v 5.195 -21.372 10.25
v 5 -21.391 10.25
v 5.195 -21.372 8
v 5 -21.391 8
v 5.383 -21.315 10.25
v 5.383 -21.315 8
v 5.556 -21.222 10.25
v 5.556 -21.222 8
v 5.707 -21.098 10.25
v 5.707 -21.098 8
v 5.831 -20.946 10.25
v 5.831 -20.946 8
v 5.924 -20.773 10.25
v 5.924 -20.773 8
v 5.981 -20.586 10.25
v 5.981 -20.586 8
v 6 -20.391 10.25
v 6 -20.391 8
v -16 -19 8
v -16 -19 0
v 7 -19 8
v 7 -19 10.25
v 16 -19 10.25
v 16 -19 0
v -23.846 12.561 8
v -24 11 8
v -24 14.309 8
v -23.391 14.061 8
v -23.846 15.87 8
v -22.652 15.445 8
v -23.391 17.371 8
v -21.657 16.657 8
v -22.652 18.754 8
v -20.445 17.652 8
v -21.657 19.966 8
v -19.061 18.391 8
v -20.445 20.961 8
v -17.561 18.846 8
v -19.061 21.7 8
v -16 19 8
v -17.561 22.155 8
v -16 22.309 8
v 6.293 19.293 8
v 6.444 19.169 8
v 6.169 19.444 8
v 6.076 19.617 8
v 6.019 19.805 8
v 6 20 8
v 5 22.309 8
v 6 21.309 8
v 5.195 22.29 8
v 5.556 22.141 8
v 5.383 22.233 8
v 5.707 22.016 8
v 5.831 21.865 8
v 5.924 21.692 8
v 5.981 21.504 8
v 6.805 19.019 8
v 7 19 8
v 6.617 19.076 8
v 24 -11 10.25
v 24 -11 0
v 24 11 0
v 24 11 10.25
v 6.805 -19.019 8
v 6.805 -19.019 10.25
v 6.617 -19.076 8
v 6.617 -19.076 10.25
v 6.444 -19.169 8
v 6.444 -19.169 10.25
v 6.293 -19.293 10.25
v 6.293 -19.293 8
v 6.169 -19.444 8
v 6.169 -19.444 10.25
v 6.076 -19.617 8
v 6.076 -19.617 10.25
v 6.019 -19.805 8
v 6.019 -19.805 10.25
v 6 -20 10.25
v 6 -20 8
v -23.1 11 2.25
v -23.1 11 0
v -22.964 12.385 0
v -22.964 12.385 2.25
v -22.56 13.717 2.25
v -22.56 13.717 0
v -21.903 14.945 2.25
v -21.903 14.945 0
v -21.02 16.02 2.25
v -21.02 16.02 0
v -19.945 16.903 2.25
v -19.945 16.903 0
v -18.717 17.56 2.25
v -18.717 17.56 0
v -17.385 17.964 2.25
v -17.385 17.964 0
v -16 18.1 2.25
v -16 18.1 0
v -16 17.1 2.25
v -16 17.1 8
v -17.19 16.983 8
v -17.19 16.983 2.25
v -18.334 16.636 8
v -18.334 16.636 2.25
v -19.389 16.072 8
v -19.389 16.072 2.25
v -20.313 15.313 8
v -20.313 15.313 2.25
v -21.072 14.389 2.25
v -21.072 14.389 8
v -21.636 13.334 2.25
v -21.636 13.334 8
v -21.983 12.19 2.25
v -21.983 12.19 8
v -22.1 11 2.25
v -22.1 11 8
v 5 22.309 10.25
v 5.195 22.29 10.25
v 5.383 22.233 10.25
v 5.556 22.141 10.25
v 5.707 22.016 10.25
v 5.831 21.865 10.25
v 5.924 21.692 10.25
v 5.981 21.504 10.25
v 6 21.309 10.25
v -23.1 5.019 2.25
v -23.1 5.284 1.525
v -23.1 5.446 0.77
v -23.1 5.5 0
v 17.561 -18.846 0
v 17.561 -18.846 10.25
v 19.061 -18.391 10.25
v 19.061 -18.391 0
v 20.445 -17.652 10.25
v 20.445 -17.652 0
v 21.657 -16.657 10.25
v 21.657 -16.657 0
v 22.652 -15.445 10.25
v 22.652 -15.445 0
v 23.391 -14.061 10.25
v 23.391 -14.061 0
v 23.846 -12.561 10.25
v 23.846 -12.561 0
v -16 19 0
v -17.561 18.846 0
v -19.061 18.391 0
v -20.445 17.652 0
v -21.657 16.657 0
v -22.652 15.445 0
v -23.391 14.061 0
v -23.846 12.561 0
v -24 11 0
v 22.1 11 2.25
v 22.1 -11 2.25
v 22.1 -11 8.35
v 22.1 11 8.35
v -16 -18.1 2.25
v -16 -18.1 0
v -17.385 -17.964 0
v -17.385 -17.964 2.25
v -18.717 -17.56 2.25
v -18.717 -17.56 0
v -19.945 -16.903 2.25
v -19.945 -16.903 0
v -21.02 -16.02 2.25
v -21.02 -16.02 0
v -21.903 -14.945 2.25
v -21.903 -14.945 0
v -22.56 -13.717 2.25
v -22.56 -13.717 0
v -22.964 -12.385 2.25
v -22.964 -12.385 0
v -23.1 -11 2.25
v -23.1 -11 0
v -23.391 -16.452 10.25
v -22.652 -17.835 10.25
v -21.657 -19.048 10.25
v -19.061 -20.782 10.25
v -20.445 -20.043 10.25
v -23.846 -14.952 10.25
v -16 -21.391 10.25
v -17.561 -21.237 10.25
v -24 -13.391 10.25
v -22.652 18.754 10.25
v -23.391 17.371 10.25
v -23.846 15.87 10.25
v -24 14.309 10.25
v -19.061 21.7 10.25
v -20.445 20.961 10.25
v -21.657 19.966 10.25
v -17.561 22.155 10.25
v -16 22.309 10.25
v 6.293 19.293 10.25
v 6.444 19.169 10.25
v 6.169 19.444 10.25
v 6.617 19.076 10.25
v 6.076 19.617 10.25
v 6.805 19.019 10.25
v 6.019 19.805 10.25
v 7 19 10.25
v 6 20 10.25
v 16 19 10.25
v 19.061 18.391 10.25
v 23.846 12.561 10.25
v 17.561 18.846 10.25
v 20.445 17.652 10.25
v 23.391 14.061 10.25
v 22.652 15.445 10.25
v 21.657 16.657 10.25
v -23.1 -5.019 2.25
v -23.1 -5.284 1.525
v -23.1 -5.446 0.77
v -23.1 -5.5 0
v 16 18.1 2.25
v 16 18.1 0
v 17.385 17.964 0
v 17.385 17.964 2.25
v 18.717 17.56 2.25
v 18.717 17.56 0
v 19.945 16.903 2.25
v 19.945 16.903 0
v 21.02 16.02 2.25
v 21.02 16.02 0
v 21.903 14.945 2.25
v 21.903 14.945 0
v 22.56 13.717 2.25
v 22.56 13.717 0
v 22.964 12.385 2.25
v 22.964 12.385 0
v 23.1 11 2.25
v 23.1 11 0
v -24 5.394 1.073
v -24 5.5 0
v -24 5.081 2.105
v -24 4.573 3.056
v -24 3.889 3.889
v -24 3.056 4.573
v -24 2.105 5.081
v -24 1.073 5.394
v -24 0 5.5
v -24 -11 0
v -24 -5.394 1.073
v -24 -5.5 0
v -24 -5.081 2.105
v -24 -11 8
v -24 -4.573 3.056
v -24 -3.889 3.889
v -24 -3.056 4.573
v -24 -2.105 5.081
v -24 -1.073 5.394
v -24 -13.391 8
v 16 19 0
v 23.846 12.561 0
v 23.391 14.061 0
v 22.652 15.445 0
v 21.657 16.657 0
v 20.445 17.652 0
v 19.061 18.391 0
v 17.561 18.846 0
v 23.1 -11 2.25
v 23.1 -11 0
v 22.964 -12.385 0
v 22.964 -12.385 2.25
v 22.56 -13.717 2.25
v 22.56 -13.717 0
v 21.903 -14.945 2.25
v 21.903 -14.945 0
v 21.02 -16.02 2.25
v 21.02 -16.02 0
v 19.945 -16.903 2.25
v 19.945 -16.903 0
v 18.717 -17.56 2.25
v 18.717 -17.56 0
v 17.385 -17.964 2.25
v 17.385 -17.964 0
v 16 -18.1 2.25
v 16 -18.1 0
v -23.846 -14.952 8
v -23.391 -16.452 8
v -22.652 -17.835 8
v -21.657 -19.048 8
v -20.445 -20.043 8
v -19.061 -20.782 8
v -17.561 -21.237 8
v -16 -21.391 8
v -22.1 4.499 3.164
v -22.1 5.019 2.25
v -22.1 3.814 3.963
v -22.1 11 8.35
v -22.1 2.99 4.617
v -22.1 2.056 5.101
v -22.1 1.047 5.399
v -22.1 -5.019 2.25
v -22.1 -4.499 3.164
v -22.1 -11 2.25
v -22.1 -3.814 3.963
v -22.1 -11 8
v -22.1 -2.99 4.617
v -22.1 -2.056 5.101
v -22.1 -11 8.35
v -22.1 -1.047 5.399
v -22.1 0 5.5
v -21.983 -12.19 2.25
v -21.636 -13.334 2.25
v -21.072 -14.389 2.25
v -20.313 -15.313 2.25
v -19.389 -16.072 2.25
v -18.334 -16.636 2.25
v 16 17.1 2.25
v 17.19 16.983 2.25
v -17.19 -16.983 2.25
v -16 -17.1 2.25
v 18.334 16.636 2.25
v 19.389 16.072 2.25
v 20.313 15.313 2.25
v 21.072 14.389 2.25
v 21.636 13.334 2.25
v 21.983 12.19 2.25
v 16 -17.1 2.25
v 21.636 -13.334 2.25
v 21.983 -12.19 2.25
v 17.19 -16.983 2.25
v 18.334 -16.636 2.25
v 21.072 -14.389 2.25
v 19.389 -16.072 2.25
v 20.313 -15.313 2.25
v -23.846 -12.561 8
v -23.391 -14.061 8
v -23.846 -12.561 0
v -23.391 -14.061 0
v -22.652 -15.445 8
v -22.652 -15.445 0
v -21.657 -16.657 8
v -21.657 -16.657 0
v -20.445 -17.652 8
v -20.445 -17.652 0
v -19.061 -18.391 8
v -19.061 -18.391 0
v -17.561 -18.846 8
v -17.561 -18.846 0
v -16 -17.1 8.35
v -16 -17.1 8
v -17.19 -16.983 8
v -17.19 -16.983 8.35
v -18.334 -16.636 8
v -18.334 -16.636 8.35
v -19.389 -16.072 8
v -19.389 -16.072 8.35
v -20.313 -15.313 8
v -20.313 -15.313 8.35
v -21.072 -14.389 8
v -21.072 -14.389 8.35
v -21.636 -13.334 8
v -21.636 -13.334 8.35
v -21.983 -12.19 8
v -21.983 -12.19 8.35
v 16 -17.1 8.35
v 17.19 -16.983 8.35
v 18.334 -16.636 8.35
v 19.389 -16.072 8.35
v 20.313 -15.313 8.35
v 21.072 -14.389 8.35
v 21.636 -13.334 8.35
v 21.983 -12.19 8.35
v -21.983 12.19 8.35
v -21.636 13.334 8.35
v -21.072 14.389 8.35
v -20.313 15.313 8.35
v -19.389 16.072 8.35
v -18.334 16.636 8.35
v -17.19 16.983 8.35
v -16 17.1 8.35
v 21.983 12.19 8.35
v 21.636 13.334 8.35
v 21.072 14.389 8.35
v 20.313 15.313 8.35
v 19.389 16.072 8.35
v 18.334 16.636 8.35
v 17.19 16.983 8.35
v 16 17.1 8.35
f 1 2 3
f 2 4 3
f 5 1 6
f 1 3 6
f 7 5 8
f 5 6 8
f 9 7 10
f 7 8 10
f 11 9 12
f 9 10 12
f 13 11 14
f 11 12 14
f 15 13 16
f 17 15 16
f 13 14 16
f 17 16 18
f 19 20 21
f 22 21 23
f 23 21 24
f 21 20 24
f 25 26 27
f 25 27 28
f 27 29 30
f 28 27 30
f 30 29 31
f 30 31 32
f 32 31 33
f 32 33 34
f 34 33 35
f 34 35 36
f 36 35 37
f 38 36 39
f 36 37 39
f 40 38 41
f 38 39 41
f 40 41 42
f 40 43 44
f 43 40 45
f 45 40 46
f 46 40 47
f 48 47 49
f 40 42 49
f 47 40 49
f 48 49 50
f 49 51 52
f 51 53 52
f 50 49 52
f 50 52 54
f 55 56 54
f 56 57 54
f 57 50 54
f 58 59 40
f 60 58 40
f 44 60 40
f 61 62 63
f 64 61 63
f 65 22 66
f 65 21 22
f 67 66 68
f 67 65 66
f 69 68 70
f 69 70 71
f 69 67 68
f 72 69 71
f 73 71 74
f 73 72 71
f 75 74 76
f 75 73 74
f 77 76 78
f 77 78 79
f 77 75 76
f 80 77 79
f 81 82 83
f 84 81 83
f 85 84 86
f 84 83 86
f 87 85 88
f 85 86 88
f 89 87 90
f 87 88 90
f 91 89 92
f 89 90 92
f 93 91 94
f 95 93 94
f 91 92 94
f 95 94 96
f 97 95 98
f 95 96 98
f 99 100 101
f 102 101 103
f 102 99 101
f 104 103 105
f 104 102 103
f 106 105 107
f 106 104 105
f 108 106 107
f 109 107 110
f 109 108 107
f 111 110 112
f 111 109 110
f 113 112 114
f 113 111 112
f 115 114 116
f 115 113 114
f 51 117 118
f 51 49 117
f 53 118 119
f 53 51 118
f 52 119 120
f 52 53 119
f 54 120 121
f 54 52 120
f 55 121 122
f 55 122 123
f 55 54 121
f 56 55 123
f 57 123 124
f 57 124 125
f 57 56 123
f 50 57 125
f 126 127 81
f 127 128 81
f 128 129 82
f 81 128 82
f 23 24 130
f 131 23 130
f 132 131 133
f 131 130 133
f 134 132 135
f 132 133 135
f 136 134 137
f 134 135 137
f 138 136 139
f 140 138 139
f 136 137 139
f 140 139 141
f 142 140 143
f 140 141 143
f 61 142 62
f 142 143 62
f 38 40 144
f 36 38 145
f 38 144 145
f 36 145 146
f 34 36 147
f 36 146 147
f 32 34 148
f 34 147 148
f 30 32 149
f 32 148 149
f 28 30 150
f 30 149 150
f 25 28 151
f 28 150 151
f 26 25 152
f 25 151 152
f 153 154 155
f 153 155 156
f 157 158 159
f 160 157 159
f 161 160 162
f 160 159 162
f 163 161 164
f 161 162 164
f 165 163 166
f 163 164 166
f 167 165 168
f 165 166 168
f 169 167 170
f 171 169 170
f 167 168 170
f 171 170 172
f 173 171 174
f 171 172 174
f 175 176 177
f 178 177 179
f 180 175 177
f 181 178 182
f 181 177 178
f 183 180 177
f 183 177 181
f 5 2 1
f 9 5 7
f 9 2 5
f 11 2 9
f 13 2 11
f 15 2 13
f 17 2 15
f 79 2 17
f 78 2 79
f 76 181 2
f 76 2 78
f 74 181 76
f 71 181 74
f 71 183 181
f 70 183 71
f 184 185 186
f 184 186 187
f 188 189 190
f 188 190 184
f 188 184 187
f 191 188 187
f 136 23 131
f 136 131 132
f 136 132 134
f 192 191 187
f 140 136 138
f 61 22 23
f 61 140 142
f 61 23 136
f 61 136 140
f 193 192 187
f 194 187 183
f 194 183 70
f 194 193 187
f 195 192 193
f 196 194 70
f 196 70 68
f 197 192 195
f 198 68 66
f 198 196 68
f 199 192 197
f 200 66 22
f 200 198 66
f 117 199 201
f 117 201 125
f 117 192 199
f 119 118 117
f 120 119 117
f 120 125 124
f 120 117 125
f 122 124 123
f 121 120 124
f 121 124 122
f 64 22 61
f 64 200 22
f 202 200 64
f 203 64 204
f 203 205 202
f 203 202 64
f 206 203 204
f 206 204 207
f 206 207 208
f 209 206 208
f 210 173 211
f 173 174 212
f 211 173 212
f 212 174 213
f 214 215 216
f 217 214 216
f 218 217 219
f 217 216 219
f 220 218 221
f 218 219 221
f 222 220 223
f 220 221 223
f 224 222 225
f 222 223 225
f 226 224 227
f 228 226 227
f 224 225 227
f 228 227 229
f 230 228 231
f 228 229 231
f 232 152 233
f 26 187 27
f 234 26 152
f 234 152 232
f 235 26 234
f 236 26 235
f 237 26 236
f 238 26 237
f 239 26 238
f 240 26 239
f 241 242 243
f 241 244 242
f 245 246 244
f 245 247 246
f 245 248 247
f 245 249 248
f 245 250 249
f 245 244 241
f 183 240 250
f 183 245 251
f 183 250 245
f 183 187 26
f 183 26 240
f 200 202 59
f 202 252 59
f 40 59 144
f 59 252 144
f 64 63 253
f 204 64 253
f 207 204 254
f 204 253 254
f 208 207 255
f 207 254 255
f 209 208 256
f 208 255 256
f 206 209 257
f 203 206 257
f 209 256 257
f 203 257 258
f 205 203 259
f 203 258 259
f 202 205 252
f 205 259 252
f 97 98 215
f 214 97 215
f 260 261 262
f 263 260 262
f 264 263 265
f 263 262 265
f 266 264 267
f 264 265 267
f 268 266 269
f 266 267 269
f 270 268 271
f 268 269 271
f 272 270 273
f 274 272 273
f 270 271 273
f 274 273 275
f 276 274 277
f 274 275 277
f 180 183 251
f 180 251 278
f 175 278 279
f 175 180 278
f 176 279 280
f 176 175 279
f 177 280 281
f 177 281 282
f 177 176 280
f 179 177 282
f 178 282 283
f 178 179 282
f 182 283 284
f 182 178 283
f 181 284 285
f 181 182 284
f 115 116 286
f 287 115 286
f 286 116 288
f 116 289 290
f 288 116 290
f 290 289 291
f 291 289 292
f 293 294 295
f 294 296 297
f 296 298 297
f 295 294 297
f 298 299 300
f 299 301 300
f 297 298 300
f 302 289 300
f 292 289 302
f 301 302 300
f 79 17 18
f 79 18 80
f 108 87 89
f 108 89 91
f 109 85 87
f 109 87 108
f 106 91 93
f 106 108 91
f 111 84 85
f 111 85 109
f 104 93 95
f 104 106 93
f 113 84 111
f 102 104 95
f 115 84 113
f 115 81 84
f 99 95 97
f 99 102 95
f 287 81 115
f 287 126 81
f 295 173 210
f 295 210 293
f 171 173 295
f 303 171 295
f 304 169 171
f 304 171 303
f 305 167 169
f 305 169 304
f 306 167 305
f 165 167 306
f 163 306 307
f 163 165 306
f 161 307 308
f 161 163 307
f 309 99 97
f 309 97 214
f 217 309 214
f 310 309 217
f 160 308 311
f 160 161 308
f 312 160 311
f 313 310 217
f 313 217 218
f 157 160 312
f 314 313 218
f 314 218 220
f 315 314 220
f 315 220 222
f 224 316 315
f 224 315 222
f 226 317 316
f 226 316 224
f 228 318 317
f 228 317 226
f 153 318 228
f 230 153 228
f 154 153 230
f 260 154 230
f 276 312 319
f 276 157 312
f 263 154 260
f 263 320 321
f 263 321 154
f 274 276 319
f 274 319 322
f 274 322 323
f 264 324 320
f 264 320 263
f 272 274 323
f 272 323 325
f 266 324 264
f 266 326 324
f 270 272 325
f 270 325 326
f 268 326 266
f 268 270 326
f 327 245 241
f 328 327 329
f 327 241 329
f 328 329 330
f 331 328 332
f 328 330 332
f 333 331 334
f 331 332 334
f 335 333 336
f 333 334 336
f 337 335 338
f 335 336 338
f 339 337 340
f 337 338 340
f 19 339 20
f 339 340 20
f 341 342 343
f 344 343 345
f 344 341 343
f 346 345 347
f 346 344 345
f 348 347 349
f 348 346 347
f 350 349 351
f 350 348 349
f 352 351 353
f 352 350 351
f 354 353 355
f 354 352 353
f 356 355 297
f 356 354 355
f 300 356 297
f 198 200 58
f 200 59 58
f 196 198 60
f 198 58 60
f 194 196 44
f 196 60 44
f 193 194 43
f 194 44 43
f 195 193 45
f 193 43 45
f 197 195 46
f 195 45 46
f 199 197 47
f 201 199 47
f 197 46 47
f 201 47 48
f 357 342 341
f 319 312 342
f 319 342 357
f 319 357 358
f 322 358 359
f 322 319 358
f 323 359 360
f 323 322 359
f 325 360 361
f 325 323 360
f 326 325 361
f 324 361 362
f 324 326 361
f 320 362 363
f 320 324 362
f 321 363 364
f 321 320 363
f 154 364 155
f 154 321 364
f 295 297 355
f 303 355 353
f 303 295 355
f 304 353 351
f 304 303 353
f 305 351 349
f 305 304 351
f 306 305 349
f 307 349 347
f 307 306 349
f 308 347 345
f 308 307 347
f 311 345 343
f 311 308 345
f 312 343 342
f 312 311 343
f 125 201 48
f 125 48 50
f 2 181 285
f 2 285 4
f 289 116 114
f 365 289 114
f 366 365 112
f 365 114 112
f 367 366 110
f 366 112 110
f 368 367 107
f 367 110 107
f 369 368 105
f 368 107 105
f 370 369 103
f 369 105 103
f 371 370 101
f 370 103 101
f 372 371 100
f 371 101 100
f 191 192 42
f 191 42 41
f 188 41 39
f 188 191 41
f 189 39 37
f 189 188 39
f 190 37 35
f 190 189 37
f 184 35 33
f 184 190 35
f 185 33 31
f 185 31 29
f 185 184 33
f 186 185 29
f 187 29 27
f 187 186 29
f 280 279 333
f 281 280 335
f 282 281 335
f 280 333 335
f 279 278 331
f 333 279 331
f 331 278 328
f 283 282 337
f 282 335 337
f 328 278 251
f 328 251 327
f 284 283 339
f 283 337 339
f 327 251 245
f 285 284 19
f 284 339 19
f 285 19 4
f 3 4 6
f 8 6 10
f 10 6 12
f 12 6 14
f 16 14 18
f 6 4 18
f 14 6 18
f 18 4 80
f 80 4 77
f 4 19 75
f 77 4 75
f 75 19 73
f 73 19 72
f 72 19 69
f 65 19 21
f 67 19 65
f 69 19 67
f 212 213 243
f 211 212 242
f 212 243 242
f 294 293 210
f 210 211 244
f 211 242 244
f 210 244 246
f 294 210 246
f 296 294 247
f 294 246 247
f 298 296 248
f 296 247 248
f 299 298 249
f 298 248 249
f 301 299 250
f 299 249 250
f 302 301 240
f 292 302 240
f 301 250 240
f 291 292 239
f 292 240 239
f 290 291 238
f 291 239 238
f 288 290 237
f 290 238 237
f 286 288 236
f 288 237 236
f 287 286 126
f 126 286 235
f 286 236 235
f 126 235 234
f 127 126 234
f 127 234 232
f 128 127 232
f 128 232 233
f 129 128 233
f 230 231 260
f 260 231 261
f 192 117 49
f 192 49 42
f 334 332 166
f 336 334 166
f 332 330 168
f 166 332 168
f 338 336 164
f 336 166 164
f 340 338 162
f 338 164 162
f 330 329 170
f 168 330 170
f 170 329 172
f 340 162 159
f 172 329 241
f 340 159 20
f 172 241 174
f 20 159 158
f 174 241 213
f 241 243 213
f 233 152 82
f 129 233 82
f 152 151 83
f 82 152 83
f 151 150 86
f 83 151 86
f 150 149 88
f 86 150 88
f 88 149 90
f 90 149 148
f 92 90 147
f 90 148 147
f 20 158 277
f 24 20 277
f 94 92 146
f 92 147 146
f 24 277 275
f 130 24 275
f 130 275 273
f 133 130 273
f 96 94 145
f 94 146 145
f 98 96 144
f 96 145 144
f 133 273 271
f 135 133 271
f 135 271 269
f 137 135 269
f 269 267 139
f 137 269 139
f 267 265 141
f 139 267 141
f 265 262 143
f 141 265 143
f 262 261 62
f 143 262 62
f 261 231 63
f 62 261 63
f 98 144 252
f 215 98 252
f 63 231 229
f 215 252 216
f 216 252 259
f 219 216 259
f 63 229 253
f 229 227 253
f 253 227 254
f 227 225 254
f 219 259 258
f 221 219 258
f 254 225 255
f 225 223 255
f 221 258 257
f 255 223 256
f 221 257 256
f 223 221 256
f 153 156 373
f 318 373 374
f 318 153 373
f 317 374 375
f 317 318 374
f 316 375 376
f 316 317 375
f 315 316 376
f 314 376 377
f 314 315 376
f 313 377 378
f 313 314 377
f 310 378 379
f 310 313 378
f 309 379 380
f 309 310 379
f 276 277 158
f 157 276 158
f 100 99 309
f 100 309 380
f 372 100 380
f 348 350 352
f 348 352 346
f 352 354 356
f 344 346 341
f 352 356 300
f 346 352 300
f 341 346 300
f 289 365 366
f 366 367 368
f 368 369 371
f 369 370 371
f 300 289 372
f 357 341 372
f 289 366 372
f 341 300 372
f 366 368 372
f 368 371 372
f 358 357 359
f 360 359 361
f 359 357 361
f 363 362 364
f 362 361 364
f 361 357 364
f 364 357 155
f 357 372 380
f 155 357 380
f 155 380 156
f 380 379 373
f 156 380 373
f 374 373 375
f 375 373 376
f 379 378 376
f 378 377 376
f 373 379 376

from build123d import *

# Parameters (mm, degrees)
F1_DEPTH     = 10.25
F3_DEPTH     = 2.25
F4_R         = 1
F5_T         = 1.9
F5_T3_DEPTH  = 4.8
F5_T5_DEPTH  = 25.8
F5_T8_ANGLE  = 90.000000001
F5_T10_ANGLE = 90.000000001
F7_DEPTH     = 2.25
F9_DEPTH     = 6.4


# Not quite as in the source:
# - a shell that OpenCascade refuses in one call is made with other operations: the cavity is built on its own and cut out


with BuildPart() as f1:
    # F0 (on Top) → F1 (new body)
    with BuildSketch(Plane.XY):
        with BuildLine():
            Line((16, 19), (-16, 19))
            ThreePointArc((-16, 19), (-21.6568542495, 16.6568542495), (-24, 11))
            Line((-24, 11), (-24, -11))
            ThreePointArc((-24, -11), (-21.6568542495, -16.6568542495), (-16, -19))
            Line((-16, -19), (16, -19))
            ThreePointArc((16, -19), (21.6568542495, -16.6568542495), (24, -11))
            Line((24, -11), (24, 11))
            ThreePointArc((24, 11), (21.6568542495, 16.6568542495), (16, 19))
        make_face()
    extrude(amount=F1_DEPTH)

    # F2 (on face) → F3 (join)
    with BuildSketch(Plane.XY.offset(10.25)):
        with BuildLine():
            Line((6, 22.309198174), (-16, 22.309198174))
            ThreePointArc((-16, 22.309198174), (-21.6568542495, 19.9660524235), (-24, 14.309198174))
            Line((-24, 14.309198174), (-24, 11))
            ThreePointArc((-24, 11), (-21.6568542495, 16.6568542495), (-16, 19))
            Line((-16, 19), (6, 19))
            Line((6, 19), (6, 22.309198174))
        make_face()
        with BuildLine():
            Line((6, -21.390801826), (6, -19))
            Line((6, -19), (-16, -19))
            ThreePointArc((-16, -19), (-21.6568542495, -16.6568542495), (-24, -11))
            Line((-24, -11), (-24, -13.390801826))
            ThreePointArc((-24, -13.390801826), (-21.6568542495, -19.0476560755), (-16, -21.390801826))
            Line((-16, -21.390801826), (6, -21.390801826))
        make_face()
    extrude(amount=-F3_DEPTH)

    # F4
    f4_edges = [f1.edges().sort_by_distance(p)[0] for p in [
        (6, -21.390802, 9.125),
        (6, -19, 9.125),
        (6, 19, 9.125),
        (6, 22.309198, 9.125),
    ]]
    fillet(f4_edges, radius=F4_R)

    # F5: shell of thickness 1.9, made by hand


with BuildPart() as f5_core1:
    # F5_t2: copy of F1
    add(f1.part)

    # the walls: a layer under each face that stays
    f5_faces = [f5_core1.faces().sort_by_distance(p)[0] for p in [
        (0, 19, 5.125),
        (0, 0.459198174, 10.25),
        (6.2928932188, 19.2928932188, 9.125),
        (21.6568542495, 16.6568542495, 5.125),
        (-18.8333333333, 20.4243318117, 8),
        (-21.6568542495, 16.6568542495, 4),
        (6, 20.654599087, 9.125),
        (24, 0, 5.125),
        (21.6568542495, -16.6568542495, 5.125),
        (-5.5, 22.309198174, 9.125),
        (0, -19, 5.125),
        (-21.6568542495, 19.9660524235, 9.125),
        (6.2928932188, -19.2928932188, 9.125),
        (-24, 0.459198174, 5.125),
        (6, -20.195400913, 9.125),
        (-21.6568542495, -19.0476560755, 9.125),
        (-5.5, -21.390801826, 9.125),
        (-21.6568542495, -16.6568542495, 4),
        (-18.8333333333, -19.6590015216, 8),
    ]]
    thicken(f5_faces, amount=-F5_T, mode=Mode.SUBTRACT)

    # F5_s4 → F5_t3 (cut)
    with BuildSketch(Plane.YZ.offset(4.1)):
        Polygon((19.019, 7.981), (17.1, 8), (17.1, 9.9), (19, 9.9), align=None)
        Polygon((-19.019, 7.981), (-17.1, 8), (-17.1, 9.9), (-19, 9.9), align=None)
    extrude(amount=F5_T3_DEPTH, mode=Mode.SUBTRACT)

    # F5_s6 → F5_t5 (cut)
    with BuildSketch(Plane.YZ.offset(-17.9)):
        Polygon((19.019, 7.981), (17.1, 8), (17.1, 9.9), (19, 9.9), align=None)
        Polygon((-19.019, 7.981), (-17.1, 8), (-17.1, 9.9), (-19, 9.9), align=None)
    extrude(amount=F5_T5_DEPTH, mode=Mode.SUBTRACT)

    # F5_s7 → F5_t8 (revolve, cut)
    with BuildSketch(Plane.XZ.offset(-11)):
        Polygon((-24.019, 7.981), (-24, 9.9), (-22.1, 9.9), (-22.1, 8), align=None)
    revolve(axis=Axis((-16, 11, 8), (0, 0, -1)), revolution_arc=F5_T8_ANGLE, mode=Mode.SUBTRACT)

    # F5_s9 → F5_t10 (revolve, cut)
    with BuildSketch(Plane.YZ.offset(-16)):
        Polygon((-19.019, 7.981), (-17.1, 8), (-17.1, 9.9), (-19, 9.9), align=None)
    revolve(axis=Axis((-16, -11, 8), (0, 0, -1)), revolution_arc=F5_T10_ANGLE, mode=Mode.SUBTRACT)


with BuildPart() as f1_1:
    add(f1.part)

    # what is left inside the walls is the cavity
    f5_cavity = [f5_core1.part.solids().sort_by_distance(p)[0] for p in [
        (0, -5.7, 0.019),
    ]]
    add(f5_cavity, mode=Mode.SUBTRACT)

    # F6 (on face) → F7 (cut)
    with BuildSketch(Plane(origin=(0, 0, 0), x_dir=(1, 0, 0), z_dir=(0, 0, -1))):
        with BuildLine():
            ThreePointArc((-16, 18.1000009179), (-21.0204587955, 16.0204587955), (-23.1000009179, 11))
            Line((-23.1000009179, 11), (-23.1000009179, -11))
            ThreePointArc((-23.1000009179, -11), (-21.0204587955, -16.0204587955), (-16, -18.1000009179))
            Line((-16, -18.1000009179), (16, -18.1000009179))
            ThreePointArc((16, -18.1000009179), (21.0204587955, -16.0204587955), (23.1000009179, -11))
            Line((23.1000009179, -11), (23.1000009179, 11))
            ThreePointArc((23.1000009179, 11), (21.0204587955, 16.0204587955), (16, 18.1000009179))
            Line((16, 18.1000009179), (-16, 18.1000009179))
        make_face()
        with BuildLine():
            Line((16, -17.1), (-16, -17.1))
            ThreePointArc((-16, -17.1), (-20.3133513652, -15.3133513652), (-22.1, -11))
            Line((-22.1, -11), (-22.1, 11))
            ThreePointArc((-22.1, 11), (-20.3133513652, 15.3133513652), (-16, 17.1))
            Line((-16, 17.1), (16, 17.1))
            ThreePointArc((16, 17.1), (20.3133513652, 15.3133513652), (22.1, 11))
            Line((22.1, 11), (22.1, -11))
            ThreePointArc((22.1, -11), (20.3133513652, -15.3133513652), (16, -17.1))
        make_face(mode=Mode.SUBTRACT)
    extrude(amount=-F7_DEPTH, mode=Mode.SUBTRACT)

    # F8 (on face) → F9 (cut)
    with BuildSketch(Plane(origin=(-24, 0, 0), x_dir=(0, -1, 0), z_dir=(-1, 0, 0))):
        with BuildLine():
            Line((-5.5, 0), (5.5, 0))
            ThreePointArc((5.5, 0), (0, 5.5), (-5.5, 0))
        make_face()
    extrude(amount=-F9_DEPTH, mode=Mode.SUBTRACT)


solid = f1_1.part
